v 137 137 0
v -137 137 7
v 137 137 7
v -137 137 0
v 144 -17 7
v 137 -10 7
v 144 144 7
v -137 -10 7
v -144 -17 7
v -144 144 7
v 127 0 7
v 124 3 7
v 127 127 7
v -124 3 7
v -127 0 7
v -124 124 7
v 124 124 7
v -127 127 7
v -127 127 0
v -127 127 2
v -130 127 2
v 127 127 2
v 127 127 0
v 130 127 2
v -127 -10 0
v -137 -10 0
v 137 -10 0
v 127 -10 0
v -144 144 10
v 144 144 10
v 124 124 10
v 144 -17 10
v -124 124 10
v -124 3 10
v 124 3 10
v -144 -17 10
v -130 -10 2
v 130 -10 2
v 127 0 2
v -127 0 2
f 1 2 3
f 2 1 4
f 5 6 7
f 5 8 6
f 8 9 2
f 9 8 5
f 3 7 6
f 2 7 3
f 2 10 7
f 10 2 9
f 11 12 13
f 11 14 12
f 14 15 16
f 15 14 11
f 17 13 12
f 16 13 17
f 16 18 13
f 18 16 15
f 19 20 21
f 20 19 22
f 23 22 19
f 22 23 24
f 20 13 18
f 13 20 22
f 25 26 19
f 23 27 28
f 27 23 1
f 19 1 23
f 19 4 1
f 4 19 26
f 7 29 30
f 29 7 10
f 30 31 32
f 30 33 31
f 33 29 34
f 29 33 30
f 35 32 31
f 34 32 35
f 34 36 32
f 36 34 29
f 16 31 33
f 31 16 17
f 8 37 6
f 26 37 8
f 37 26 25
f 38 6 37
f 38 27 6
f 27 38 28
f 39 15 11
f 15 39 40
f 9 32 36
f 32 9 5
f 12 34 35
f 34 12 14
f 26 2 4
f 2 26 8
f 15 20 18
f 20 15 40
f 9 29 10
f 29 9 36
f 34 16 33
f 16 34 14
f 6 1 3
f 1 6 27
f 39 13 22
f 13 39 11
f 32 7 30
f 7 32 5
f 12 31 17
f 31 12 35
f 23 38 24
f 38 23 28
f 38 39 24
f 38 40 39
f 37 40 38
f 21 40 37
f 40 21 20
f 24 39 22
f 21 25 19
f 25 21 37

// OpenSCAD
// Picture Frame Generator
// Parameters for art dimensions
art_width_inches = 10;
art_height_inches = 5;

// Frame parameters
frame_side_thickness = 10;  // Thickness of the sides of the frame in x/y direction
frame_front_width = 20;     // Width of frame border
internal_glass_overlap = 3; // How much the border overlaps the glass
frame_front_thickness = 3;  // distance from front of frame to the glass
glass_thickness = 3;   // Thickness of glass pane
picture_thickness =1;  // Thickness of the picture
foam_spacer_thickness = 1; // Thickness of foam spacer
backing_thickness = 2;    // Thickness of backing board
// assumption is that backing board is flush with back of frame and has a 45degree cut to hold onto frame
backing_groove_depth = 3;  // Depth of the groove that the backing board slides into
hanger_cutout_diameter = 5; // Diameter of the hanger cutout on the backing board
landscape_mode = true; // Whether to make the frame in landscape mode
make_backing_insert = false; // Whether to make a backing insert

module stopthecustomizer() {
   // This module is intentionally left empty to stop customizer issues
}
mm_per_inch = 25.4; // for testing purposes, set to 10 instead of 25.4

art_width = art_width_inches * mm_per_inch;
art_height = art_height_inches * mm_per_inch;   
framebody_z_dimension = glass_thickness + picture_thickness + foam_spacer_thickness + backing_thickness;

module frameBevel(length, width, height) {
    translate([-(length+2*width)/2,-width/2,0])
        linear_extrude(height = height)
            polygon([
                [0, 0],
                [length + 2*width, 0],
                [length + width, width],
                [width, width]
            ]);
}

module backplateBevel(length, width)
{
    difference()
    {
        linear_extrude(height = length)
            polygon([
                [0, 0],
                [-backing_groove_depth, backing_thickness],
                [width + backing_groove_depth, backing_thickness],
                [width, 0]
            ]);
        translate([width/2, backing_thickness/2, 0.8 * length])
            rotate([90,0,0])
                cylinder(h=backing_thickness, r=hanger_cutout_diameter/2, center=true);
    }
}

module backplate()
{
    if (landscape_mode) {
        translate([-art_width/2, art_height , 0])
            rotate([90,0,0])
                backplateBevel(art_height+frame_side_thickness, art_width);
    } else {
       translate([-art_width/2,0, 0])
            rotate([90,0,90])
                backplateBevel(art_width+frame_side_thickness, art_height);
    }
}

module frameSide(internal_length) {
    union()
    {
        frameBevel(internal_length, frame_side_thickness, framebody_z_dimension);

        translate([0, -frame_front_width/2 + frame_side_thickness/2 + internal_glass_overlap, framebody_z_dimension])
            frameBevel(internal_length-2*internal_glass_overlap, frame_front_width, frame_front_thickness); 
    }
}

module frameAssembly()
{
    union()
    {
        // Top frame side
        translate([0, art_height + frame_side_thickness/2, 0])
            rotate([0,0,180])
                frameSide(art_width);
        // Bottom frame side
        translate([0, -frame_side_thickness/2, 0])
                frameSide(art_width);
        // Left frame side
        translate([-art_width/2-frame_side_thickness/2, art_height/2, 0])
            rotate([0,0,-90])
                frameSide(art_height);
        // Right frame side
        translate([art_width/2 + frame_side_thickness/2, art_height/2, 0])
            rotate([0,0,90])
                frameSide(art_height);
    }
}

if (!make_backing_insert)
{
    difference()
    {
        frameAssembly();    
        backplate();
    }
} else {
    backplate();
}
